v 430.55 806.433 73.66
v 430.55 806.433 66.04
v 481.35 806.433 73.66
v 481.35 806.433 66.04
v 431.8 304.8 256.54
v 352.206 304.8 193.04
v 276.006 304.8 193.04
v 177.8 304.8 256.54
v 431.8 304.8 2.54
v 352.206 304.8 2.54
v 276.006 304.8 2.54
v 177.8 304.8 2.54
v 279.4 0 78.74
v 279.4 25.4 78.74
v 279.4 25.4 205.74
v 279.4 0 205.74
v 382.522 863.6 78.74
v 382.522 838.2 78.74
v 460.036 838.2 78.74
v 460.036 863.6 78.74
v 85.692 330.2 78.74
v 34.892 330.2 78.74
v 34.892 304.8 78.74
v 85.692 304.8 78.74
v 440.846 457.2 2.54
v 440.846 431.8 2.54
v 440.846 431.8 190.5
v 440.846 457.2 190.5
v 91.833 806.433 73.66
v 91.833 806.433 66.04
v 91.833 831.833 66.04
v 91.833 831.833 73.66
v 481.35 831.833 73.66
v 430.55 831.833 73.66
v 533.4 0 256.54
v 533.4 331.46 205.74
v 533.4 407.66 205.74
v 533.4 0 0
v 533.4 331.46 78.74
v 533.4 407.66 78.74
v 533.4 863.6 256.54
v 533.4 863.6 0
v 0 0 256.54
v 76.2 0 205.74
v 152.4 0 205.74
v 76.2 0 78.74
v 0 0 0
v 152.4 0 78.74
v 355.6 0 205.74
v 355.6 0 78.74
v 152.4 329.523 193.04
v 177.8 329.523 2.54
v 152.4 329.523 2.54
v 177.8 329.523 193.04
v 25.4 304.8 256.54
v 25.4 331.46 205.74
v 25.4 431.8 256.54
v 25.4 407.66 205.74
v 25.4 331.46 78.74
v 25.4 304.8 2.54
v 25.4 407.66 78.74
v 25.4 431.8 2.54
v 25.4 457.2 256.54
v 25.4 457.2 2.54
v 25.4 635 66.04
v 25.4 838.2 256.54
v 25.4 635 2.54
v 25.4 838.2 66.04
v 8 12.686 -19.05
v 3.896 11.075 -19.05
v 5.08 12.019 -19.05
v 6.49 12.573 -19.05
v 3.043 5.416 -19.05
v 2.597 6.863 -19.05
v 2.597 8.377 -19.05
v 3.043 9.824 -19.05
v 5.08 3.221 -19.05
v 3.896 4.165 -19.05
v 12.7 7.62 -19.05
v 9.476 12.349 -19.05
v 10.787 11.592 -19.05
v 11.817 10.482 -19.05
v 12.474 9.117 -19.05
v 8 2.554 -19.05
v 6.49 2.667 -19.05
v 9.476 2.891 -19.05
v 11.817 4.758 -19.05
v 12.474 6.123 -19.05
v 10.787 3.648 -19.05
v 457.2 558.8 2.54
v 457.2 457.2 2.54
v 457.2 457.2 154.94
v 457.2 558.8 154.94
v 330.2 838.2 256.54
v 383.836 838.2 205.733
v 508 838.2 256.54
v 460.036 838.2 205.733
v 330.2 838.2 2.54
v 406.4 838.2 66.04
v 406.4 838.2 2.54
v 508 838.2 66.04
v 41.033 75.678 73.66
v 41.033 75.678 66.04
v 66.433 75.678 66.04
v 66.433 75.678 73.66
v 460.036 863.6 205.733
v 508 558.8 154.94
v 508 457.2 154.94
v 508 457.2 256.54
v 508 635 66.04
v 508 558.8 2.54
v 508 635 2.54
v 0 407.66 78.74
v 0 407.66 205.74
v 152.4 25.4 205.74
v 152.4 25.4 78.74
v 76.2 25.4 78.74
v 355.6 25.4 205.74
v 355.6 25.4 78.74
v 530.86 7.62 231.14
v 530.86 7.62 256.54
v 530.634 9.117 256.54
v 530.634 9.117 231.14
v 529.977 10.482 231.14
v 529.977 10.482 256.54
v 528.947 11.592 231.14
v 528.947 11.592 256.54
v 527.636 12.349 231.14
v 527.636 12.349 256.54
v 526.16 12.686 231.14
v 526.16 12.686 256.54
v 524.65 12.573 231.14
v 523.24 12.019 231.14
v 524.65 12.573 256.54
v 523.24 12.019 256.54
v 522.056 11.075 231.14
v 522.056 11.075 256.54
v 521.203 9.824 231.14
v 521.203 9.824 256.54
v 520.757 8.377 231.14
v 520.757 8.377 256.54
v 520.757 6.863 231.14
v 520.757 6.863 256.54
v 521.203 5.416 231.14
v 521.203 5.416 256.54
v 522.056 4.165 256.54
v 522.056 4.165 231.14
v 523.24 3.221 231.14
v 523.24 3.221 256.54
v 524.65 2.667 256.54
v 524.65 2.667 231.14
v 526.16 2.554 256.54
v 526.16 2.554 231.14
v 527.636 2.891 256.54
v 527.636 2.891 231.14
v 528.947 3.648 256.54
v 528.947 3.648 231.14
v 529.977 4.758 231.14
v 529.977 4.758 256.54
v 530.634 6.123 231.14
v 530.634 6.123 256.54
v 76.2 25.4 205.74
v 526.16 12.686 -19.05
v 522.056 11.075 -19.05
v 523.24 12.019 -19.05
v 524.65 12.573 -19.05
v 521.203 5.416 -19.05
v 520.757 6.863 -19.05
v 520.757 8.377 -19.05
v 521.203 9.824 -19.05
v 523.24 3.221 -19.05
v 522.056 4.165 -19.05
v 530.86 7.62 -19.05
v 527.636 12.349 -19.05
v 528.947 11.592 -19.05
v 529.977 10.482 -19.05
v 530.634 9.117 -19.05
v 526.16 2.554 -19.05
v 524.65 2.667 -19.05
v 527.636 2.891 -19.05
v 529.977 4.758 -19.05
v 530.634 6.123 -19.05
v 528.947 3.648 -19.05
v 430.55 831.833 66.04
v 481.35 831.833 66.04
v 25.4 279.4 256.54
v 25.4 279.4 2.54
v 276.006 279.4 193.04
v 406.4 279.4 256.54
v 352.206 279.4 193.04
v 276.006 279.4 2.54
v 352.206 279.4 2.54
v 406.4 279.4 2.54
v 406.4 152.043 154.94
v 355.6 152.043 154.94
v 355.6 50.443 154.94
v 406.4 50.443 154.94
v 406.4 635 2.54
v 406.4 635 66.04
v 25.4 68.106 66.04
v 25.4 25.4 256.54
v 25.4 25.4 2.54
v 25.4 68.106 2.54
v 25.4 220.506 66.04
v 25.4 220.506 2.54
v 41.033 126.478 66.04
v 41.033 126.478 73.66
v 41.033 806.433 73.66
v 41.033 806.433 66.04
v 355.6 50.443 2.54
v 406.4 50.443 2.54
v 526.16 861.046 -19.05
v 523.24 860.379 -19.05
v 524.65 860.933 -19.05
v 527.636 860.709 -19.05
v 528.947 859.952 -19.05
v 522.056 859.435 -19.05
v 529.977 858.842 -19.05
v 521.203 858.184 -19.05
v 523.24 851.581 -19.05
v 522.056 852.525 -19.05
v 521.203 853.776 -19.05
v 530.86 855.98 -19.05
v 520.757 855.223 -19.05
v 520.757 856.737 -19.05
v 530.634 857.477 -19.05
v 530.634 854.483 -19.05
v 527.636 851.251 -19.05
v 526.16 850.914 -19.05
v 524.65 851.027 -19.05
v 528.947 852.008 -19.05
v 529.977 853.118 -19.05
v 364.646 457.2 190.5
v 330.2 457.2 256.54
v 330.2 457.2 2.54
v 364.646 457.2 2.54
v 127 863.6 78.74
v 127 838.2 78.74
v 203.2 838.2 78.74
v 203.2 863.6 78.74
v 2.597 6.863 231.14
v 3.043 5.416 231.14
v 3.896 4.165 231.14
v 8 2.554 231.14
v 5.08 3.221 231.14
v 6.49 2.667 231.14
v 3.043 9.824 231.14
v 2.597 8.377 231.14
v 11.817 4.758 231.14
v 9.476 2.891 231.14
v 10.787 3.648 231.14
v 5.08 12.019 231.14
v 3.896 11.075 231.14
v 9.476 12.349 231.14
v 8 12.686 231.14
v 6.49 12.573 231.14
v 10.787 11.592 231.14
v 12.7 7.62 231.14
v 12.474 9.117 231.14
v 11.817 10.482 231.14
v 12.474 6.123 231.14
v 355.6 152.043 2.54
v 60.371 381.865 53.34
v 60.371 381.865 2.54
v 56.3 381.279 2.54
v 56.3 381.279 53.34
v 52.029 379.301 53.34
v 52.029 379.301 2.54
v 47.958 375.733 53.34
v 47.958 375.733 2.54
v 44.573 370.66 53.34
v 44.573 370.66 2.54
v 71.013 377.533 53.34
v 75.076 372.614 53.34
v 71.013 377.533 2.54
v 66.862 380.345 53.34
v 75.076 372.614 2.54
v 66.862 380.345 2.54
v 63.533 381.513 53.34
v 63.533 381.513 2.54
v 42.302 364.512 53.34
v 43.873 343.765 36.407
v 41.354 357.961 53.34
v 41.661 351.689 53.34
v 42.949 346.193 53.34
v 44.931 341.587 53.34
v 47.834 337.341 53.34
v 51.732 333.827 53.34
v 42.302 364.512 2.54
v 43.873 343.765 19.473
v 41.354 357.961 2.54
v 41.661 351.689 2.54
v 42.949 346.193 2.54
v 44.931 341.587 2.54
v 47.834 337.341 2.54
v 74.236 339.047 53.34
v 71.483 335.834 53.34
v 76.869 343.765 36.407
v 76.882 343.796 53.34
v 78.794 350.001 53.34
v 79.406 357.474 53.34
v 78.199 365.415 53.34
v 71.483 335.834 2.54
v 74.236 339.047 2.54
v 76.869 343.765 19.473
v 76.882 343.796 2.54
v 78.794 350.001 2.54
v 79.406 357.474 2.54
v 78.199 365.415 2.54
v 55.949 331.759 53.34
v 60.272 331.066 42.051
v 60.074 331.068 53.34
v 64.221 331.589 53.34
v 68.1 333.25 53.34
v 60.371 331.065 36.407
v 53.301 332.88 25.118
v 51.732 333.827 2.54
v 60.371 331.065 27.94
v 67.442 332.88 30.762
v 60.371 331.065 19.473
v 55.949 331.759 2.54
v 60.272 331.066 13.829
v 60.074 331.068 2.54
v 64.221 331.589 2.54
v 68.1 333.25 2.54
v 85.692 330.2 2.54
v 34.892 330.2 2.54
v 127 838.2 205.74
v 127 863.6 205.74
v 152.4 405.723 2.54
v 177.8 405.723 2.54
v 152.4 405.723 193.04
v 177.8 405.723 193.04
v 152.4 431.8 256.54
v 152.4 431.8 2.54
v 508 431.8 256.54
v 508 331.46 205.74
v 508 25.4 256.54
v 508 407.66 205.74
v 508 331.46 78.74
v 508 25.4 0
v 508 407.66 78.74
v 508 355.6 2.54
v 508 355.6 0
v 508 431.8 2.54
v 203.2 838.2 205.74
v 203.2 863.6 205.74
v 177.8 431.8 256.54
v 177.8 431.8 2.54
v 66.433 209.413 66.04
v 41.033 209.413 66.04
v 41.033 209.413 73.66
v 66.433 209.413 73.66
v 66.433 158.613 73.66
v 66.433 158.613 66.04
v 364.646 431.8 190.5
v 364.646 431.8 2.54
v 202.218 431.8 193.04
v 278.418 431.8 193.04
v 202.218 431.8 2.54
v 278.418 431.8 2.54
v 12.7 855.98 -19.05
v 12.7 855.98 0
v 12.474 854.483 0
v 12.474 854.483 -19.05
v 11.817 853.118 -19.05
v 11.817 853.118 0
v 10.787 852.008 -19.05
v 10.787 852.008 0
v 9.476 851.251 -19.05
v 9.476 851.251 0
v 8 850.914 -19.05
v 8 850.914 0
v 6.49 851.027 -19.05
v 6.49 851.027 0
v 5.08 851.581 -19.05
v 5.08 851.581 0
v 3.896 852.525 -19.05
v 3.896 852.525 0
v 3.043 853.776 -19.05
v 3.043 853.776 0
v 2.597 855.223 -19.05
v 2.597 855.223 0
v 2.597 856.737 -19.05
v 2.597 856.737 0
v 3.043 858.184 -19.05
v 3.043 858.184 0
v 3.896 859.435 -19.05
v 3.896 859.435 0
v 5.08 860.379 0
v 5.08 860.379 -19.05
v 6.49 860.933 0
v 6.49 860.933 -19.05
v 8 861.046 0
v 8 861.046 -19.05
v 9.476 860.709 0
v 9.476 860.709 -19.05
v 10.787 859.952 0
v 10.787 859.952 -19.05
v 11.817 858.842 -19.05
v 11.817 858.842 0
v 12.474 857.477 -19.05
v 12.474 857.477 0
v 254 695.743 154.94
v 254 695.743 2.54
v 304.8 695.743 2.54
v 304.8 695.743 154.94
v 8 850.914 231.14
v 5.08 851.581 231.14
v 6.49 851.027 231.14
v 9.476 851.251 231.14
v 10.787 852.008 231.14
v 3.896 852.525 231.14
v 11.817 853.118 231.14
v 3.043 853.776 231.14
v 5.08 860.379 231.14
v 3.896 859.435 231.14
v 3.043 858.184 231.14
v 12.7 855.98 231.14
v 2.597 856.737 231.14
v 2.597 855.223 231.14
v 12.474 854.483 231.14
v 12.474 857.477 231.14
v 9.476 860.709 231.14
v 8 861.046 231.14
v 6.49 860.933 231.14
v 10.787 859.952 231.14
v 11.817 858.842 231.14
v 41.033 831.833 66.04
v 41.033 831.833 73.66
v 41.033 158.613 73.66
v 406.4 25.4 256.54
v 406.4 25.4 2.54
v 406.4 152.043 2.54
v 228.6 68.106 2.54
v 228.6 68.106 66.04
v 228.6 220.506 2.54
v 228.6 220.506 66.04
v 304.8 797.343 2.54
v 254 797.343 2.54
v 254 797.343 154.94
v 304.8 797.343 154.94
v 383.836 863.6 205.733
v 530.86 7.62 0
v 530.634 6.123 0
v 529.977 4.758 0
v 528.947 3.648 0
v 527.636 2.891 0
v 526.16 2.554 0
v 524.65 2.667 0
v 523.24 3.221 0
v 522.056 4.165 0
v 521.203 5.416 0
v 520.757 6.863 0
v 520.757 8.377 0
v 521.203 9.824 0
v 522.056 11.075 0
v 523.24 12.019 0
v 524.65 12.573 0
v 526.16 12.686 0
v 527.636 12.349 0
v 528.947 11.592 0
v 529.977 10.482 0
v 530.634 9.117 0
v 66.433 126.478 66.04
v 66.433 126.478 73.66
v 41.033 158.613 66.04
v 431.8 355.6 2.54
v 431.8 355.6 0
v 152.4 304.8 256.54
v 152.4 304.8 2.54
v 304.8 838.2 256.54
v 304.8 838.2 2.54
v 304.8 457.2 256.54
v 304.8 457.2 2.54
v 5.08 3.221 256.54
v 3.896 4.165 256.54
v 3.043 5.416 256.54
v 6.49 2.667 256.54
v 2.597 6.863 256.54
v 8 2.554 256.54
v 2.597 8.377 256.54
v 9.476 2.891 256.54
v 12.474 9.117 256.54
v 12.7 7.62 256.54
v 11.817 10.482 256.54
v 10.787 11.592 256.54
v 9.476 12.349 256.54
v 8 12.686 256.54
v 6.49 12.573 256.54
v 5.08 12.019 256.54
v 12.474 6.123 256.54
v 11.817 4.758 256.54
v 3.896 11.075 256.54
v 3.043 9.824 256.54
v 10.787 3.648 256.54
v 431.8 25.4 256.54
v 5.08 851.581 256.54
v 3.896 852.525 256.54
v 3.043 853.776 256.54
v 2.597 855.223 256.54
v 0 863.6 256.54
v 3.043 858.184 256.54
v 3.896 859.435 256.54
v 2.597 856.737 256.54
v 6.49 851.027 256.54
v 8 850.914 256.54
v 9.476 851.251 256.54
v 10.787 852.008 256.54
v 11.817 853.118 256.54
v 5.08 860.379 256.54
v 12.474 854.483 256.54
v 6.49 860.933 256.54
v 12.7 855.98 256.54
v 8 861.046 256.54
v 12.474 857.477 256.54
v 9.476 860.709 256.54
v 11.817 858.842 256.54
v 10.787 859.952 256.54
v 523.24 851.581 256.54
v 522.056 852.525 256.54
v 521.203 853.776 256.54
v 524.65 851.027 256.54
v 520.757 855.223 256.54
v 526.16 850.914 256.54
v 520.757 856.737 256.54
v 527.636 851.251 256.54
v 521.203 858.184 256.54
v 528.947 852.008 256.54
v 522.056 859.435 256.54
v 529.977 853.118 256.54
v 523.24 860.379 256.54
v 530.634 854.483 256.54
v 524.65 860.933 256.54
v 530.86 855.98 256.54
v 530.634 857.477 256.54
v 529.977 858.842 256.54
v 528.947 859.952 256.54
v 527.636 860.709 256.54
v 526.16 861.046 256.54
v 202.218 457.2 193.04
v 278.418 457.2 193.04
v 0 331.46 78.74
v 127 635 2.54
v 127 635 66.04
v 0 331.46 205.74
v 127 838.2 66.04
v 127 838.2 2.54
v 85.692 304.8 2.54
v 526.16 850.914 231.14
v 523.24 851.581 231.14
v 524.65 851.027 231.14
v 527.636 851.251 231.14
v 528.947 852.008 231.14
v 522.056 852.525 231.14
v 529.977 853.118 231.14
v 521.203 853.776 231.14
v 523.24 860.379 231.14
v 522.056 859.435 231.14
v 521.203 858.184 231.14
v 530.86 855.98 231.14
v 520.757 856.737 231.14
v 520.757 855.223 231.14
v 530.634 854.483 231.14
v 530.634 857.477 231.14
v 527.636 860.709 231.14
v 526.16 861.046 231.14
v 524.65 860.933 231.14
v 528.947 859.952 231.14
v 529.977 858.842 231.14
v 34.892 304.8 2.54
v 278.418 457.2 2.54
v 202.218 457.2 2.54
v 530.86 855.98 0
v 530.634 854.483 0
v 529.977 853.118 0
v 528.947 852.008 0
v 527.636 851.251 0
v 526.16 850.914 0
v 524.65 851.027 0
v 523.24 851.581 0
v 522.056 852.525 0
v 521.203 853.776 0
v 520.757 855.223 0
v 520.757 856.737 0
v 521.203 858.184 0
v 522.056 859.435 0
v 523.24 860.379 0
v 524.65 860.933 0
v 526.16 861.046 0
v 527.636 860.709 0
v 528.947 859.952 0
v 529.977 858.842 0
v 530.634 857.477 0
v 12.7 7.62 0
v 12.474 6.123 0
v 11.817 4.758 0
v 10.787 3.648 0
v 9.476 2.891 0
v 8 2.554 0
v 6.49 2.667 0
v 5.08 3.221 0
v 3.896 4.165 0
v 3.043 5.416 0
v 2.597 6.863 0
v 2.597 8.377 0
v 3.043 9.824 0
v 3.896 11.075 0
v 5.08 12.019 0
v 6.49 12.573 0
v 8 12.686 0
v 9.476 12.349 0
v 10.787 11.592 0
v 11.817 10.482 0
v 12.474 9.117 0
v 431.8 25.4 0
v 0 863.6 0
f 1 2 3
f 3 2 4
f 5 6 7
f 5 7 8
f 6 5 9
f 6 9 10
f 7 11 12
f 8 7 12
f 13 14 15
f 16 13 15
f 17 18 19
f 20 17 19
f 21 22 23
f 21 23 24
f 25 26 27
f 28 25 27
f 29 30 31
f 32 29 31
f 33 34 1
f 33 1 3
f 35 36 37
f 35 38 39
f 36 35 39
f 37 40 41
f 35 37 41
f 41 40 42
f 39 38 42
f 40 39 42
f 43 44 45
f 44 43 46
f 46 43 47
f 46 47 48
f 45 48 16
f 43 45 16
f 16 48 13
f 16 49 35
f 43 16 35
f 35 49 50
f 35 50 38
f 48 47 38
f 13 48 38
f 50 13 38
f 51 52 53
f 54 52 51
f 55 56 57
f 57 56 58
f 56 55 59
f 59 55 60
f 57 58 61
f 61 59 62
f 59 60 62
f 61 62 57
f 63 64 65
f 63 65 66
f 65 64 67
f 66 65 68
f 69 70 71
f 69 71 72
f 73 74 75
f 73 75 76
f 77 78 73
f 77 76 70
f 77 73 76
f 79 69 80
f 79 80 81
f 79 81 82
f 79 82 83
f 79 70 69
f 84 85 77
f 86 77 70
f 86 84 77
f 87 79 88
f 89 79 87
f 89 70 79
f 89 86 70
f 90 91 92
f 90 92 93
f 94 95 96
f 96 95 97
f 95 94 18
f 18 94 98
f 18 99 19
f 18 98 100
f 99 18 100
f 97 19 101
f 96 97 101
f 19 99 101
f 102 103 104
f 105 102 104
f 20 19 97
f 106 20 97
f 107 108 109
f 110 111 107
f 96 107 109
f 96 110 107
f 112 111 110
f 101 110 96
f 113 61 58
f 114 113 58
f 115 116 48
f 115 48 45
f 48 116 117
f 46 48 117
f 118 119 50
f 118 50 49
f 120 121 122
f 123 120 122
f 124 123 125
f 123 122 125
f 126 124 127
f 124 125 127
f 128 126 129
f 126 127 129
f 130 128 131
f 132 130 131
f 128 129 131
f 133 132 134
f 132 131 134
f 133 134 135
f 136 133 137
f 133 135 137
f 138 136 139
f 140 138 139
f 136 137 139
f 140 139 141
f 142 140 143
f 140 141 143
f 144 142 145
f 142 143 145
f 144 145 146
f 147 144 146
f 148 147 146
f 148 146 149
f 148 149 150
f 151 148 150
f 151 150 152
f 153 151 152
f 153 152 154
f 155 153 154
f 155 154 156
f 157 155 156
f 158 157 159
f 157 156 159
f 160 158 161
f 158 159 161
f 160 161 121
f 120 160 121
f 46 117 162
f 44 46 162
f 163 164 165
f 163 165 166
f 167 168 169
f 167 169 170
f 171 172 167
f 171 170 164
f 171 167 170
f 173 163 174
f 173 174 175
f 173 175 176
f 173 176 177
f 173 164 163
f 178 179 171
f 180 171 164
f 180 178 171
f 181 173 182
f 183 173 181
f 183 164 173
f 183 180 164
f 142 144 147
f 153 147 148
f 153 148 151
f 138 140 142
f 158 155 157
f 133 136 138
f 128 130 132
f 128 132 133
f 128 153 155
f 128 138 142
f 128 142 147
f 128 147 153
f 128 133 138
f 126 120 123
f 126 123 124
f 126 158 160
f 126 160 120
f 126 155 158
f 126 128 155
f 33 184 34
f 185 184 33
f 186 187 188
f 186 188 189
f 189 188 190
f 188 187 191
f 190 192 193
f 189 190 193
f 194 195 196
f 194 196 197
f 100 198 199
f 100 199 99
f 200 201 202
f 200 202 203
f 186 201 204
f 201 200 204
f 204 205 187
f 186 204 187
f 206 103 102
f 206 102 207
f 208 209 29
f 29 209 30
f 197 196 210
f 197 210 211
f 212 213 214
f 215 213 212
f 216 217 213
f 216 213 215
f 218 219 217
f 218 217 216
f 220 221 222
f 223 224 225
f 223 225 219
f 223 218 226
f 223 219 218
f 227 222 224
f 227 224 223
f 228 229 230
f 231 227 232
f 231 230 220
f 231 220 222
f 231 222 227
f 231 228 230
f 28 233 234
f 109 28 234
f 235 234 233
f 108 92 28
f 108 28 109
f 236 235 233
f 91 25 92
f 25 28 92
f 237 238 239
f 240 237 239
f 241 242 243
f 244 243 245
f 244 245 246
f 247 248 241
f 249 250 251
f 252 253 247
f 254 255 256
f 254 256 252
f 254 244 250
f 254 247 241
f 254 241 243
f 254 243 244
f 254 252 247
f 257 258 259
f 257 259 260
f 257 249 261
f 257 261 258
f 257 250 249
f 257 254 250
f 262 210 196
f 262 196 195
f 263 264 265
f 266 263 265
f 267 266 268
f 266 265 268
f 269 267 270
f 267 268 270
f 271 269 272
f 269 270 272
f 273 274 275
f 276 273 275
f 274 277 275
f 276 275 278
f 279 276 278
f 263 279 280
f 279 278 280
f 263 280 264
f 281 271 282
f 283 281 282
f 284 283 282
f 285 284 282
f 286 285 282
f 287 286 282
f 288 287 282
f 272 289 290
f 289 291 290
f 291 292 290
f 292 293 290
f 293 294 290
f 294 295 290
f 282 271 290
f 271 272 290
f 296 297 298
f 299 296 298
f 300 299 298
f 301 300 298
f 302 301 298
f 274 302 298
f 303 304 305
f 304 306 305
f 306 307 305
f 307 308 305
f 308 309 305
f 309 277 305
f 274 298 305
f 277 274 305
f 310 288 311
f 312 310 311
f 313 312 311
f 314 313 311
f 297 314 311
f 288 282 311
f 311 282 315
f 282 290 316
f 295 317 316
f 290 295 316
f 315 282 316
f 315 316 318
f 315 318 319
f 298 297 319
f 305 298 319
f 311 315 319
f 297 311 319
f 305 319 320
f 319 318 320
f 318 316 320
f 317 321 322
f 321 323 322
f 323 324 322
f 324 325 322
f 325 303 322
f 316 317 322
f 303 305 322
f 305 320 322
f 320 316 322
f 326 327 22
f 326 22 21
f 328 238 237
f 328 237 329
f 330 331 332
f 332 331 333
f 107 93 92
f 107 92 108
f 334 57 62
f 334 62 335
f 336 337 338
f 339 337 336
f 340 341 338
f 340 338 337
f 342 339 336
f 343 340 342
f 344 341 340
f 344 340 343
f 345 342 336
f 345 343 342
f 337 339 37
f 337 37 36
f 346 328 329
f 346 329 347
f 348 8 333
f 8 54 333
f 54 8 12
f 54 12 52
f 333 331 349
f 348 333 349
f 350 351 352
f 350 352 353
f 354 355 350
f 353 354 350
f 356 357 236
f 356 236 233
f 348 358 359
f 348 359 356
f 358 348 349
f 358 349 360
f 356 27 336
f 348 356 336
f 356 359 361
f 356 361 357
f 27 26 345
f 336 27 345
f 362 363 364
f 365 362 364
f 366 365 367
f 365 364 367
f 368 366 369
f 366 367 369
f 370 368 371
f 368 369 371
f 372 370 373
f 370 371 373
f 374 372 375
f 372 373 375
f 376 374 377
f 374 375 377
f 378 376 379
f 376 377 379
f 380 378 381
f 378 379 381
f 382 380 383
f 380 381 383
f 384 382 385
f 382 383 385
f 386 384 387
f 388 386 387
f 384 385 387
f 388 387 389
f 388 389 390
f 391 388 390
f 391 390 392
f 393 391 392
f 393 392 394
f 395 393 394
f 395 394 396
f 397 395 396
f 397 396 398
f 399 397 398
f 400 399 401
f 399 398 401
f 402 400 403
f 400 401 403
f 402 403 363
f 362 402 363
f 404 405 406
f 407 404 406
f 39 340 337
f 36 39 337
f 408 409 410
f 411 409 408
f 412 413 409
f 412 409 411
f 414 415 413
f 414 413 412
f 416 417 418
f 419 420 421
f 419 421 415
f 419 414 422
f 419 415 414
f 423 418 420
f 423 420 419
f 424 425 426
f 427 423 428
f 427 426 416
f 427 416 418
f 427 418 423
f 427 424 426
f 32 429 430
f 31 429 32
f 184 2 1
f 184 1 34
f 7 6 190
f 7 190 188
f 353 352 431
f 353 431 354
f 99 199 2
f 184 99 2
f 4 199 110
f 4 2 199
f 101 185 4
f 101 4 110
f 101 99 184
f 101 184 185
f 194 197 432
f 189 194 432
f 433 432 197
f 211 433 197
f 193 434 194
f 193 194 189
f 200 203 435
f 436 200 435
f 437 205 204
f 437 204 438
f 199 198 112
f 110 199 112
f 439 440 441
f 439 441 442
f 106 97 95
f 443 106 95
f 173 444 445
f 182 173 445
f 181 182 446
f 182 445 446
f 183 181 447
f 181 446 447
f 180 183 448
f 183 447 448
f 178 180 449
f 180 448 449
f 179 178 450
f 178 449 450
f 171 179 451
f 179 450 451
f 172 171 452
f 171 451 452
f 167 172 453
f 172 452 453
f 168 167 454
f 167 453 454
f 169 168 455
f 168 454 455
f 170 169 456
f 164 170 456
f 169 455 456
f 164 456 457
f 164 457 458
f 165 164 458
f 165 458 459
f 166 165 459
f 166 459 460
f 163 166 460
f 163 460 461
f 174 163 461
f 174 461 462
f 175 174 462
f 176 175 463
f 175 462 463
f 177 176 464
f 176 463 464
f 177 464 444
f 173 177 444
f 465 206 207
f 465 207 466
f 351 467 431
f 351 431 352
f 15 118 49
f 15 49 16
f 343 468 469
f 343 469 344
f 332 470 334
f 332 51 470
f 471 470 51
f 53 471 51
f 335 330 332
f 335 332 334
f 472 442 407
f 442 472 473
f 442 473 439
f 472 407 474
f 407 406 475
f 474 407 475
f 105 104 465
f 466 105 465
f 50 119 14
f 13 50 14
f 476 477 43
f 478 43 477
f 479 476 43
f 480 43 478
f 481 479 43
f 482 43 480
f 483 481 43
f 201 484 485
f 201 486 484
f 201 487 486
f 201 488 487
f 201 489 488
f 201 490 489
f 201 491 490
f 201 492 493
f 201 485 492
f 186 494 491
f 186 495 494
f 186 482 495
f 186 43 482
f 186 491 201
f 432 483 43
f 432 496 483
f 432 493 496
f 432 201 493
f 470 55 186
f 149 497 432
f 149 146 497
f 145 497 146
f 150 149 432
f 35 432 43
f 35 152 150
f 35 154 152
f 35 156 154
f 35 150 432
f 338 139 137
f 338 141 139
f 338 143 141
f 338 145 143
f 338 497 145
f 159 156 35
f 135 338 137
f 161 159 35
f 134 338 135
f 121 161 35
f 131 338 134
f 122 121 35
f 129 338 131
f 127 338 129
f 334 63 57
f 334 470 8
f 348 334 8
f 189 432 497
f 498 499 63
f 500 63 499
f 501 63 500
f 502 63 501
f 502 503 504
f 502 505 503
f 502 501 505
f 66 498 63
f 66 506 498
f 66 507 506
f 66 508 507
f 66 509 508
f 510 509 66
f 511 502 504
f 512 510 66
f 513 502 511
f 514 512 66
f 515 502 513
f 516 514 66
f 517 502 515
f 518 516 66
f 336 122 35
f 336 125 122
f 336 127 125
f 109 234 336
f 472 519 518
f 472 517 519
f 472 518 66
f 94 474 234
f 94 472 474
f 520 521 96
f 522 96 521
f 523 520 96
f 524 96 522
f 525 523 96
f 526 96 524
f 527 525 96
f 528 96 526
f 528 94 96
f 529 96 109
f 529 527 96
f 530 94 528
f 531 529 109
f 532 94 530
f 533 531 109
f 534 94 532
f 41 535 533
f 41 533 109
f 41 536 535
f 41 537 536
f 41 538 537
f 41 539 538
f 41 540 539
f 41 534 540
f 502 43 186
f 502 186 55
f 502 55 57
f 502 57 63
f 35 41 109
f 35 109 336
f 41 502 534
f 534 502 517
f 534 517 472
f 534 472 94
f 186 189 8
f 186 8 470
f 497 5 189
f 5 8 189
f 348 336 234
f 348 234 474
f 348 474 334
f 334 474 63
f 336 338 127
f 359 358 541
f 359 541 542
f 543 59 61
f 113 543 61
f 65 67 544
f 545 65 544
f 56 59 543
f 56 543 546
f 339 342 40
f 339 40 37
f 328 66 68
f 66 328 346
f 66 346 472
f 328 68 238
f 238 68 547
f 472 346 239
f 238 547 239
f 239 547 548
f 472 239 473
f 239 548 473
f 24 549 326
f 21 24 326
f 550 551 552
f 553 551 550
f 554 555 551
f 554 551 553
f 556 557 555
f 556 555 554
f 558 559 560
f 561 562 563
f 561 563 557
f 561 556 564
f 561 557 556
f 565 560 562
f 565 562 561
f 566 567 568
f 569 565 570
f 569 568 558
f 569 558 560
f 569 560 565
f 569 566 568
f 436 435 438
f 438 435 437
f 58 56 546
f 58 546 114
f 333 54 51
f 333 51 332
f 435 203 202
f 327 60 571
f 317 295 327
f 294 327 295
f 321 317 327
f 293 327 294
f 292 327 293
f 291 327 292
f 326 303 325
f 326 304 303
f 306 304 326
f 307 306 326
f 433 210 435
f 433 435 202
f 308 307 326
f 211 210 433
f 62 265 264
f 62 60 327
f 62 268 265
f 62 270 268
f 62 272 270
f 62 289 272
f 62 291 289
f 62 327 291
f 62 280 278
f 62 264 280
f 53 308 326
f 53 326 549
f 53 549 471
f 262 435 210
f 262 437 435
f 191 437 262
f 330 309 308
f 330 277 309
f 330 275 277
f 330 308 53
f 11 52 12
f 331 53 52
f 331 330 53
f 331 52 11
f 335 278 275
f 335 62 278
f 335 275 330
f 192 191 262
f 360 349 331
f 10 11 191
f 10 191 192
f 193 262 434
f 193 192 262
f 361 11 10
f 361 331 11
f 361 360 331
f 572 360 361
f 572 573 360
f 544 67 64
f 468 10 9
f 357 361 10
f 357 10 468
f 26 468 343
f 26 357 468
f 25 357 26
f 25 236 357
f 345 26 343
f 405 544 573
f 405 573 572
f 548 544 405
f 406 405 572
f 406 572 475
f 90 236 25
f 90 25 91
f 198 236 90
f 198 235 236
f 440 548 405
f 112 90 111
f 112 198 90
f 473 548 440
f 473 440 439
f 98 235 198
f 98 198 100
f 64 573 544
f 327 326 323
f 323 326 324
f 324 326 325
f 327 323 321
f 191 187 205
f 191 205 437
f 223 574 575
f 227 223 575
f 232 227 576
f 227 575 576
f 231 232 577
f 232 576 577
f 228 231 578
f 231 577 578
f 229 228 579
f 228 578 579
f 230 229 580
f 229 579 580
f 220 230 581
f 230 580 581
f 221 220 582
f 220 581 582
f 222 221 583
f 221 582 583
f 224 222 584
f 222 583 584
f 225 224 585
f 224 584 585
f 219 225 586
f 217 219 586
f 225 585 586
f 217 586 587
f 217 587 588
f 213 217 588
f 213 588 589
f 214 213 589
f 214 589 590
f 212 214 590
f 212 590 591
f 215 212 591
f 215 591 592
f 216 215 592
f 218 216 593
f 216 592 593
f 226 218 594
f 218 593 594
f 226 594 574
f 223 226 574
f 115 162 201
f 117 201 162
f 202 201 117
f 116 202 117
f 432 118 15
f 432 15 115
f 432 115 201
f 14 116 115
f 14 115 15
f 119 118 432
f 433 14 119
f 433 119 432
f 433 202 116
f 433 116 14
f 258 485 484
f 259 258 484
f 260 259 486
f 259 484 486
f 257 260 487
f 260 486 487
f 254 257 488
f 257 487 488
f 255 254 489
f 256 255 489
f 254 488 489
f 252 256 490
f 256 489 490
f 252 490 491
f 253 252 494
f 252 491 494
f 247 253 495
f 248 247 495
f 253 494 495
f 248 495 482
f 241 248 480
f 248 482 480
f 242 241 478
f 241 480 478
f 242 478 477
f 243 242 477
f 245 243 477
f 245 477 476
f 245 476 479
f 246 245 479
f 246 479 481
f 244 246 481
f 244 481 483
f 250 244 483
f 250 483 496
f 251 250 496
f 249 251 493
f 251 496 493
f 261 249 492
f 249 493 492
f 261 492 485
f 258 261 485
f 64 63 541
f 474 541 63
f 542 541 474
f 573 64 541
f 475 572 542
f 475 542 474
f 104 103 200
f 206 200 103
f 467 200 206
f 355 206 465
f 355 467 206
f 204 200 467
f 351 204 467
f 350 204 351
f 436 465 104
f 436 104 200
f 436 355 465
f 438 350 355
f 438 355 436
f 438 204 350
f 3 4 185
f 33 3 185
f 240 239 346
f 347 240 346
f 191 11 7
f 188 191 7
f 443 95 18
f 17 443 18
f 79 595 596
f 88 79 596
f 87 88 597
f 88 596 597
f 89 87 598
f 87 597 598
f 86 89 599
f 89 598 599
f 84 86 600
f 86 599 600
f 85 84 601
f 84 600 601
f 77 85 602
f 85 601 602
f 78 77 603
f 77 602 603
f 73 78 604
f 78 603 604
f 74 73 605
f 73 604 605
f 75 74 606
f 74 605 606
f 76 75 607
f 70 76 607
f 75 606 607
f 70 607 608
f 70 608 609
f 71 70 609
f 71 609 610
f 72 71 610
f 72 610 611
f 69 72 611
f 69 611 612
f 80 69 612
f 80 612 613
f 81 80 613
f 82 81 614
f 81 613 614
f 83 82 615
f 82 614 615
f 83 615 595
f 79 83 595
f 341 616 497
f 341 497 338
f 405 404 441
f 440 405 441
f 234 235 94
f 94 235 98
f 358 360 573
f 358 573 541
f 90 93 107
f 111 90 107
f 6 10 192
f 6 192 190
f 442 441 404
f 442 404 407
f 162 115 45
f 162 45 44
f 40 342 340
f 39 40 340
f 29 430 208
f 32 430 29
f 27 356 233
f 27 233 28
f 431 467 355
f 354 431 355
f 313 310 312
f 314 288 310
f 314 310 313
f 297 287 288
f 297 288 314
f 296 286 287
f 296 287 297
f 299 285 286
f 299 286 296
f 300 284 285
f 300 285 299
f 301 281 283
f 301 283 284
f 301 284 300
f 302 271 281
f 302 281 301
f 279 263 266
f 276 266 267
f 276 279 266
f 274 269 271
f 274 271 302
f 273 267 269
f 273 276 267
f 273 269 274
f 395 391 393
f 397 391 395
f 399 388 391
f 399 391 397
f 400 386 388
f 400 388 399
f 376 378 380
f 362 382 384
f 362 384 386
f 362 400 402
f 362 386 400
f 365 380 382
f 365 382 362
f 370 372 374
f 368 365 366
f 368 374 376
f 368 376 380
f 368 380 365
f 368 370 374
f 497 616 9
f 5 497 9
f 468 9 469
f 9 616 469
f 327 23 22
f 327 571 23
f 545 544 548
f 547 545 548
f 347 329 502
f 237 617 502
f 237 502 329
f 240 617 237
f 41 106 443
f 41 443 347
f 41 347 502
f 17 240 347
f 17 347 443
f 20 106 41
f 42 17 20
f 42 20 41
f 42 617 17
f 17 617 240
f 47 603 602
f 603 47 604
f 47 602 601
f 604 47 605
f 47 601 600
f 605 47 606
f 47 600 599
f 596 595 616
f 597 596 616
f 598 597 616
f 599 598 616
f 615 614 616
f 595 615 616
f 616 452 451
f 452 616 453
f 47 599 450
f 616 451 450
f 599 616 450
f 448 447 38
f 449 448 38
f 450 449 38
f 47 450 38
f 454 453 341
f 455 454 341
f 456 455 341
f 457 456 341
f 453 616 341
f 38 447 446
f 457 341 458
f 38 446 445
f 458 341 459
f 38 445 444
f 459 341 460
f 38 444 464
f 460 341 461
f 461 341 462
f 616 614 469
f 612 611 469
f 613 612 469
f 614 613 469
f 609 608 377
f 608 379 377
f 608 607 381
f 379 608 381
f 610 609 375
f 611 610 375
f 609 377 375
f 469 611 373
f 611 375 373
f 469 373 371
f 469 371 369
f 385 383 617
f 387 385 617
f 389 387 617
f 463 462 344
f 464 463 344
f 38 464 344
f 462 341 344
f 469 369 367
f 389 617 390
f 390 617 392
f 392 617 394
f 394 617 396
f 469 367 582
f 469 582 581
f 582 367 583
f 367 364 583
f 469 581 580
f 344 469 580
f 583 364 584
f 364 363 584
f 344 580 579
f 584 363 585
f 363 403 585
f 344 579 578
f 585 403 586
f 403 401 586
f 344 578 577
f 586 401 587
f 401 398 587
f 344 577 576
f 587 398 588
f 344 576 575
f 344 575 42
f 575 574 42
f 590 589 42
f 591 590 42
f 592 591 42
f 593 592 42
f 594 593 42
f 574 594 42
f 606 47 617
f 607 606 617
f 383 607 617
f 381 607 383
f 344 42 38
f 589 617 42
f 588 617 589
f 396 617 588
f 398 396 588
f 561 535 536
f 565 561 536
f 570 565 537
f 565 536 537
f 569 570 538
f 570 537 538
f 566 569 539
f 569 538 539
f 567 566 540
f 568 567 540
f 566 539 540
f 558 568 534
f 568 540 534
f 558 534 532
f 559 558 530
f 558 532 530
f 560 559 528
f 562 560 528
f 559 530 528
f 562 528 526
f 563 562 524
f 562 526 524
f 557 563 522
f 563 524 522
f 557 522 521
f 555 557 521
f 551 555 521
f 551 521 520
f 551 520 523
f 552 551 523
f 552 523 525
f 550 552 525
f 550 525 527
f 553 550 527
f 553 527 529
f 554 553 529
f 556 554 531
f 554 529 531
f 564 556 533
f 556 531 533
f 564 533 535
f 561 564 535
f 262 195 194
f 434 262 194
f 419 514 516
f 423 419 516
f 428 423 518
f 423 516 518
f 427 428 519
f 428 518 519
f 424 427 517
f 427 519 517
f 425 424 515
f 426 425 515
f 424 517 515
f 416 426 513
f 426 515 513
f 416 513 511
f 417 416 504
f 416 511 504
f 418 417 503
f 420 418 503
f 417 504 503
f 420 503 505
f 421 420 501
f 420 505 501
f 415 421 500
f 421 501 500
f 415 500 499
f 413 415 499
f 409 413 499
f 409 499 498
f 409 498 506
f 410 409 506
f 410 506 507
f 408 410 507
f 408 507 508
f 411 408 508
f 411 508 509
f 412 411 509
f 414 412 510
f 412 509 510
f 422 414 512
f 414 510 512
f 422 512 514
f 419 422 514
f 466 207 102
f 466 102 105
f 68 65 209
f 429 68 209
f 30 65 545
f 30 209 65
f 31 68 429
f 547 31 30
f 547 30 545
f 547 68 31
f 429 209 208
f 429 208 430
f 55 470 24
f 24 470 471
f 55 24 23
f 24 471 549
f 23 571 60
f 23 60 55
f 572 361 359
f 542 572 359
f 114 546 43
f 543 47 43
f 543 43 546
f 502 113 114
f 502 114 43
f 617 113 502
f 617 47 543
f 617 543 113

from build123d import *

# Parameters (mm, degrees)
F0_W      = 533.4
F0_H      = 863.6
F1_DEPTH  = 2.54
F2_W      = 533.4
F2_H      = 863.6
F2_W_2    = 482.6
F2_H_2    = 812.8
F3_DEPTH  = 254
F4_W      = 76.2
F4_H      = 330.2
F5_DEPTH  = 25.4
F6_W      = 177.8
F6_H      = 25.4
F6_W_2    = 279.4
F7_DEPTH  = 254
F8_W      = 25.4
F8_H      = 254
F8_H_2    = 127
F9_DEPTH  = 254
F10_W     = 76.2
F10_H     = 190.5
F10_H_2   = 187.96
F11_DEPTH = 25.4
F12_W     = 76.2
F12_H     = 190.5
F13_DEPTH = 25.4
F14_W     = 76.2
F14_H     = 190.5
F15_DEPTH = 25.4
F17_DEPTH = 25.4
F18_W     = 76.2
F18_H     = 127
F19_DEPTH = 25.4
F20_W     = 76.2
F20_H     = 127
F21_DEPTH = 25.4
F22_W     = 76.2
F22_H     = 127
F23_DEPTH = 25.4
F24_W     = 76.2
F24_H     = 127
F25_DEPTH = 25.4
F26_R     = 5.08
F27_DEPTH = 19.05
F28_R     = 5.08
F29_DEPTH = 25.4
F30_W     = 101.6
F30_H     = 203.2
F30_W_2   = 203.2
F30_H_2   = 152.4
F31_DEPTH = 63.5
F32_W     = 50.8
F32_H     = 25.4
F32_W_2   = 25.4
F32_H_2   = 50.8
F33_DEPTH = 7.62
F34_W     = 50.8
F34_H     = 101.6
F35_DEPTH = 152.4
F36_W     = 50.8
F36_H     = 25.4
F37_DEPTH = 50.8
F38_W     = 50.8
F38_H     = 25.4
F39_DEPTH = 25.4


with BuildPart() as f1:
    # F0 (on Top) → F1 (new body)
    with BuildSketch(Plane.XY):
        with Locations((266.7, 431.8)):
            Rectangle(F0_W, F0_H)
    extrude(amount=F1_DEPTH)

    # F2 (on face) → F3 (join)
    with BuildSketch(Plane.XY.offset(2.54)):
        with Locations((266.7, 431.8)):
            Rectangle(F2_W, F2_H)
        with Locations((266.7, 431.8)):
            Rectangle(F2_W_2, F2_H_2, mode=Mode.SUBTRACT)
    extrude(amount=F3_DEPTH)

    # F4 (on face) → F5 (cut)
    with BuildSketch(Plane.XY.offset(2.54)):
        with Locations((469.9, 190.5)):
            Rectangle(F4_W, F4_H)
    extrude(amount=-F5_DEPTH, mode=Mode.SUBTRACT)

    # F6 (on face) → F7 (join)
    with BuildSketch(Plane.XY.offset(2.54)):
        with Locations((419.1, 444.5)):
            Rectangle(F6_W, F6_H)
        Polygon((304.8, 431.8), (330.2, 431.8), (330.2, 457.2), (330.2, 838.2), (304.8, 838.2), (304.8, 457.2), align=None)
        with Locations((165.1, 444.5)):
            Rectangle(F6_W_2, F6_H)
    extrude(amount=F7_DEPTH)

    # F8 (on face) → F9 (join)
    with BuildSketch(Plane.XY.offset(2.54)):
        Polygon((152.4, 304.8), (25.4, 304.8), (25.4, 279.4), (406.4, 279.4), (431.8, 279.4), (431.8, 304.8), (177.8, 304.8), align=None)
        with Locations((419.1, 152.4)):
            Rectangle(F8_W, F8_H)
        with Locations((165.1, 368.3)):
            Rectangle(F8_W, F8_H_2)
    extrude(amount=F9_DEPTH)

    # F10 (on face) → F11 (cut)
    with BuildSketch(Plane.XZ.offset(-431.8)):
        with Locations((240.317534, 97.79)):
            Rectangle(F10_W, F10_H)
        with Locations((402.745839, 96.52)):
            Rectangle(F10_W, F10_H_2)
    extrude(amount=-F11_DEPTH, mode=Mode.SUBTRACT)

    # F12 (on face) → F13 (cut)
    with BuildSketch(Plane.YZ.offset(177.8)):
        with Locations((367.623325, 97.79)):
            Rectangle(F12_W, F12_H)
    extrude(amount=-F13_DEPTH, mode=Mode.SUBTRACT)

    # F14 (on face) → F15 (cut)
    with BuildSketch(Plane(origin=(0, 304.8, 0), x_dir=(-1, 0, 0), z_dir=(0, 1, 0))):
        with Locations((-314.105634, 97.79)):
            Rectangle(F14_W, F14_H)
    extrude(amount=-F15_DEPTH, mode=Mode.SUBTRACT)

    # F16 (on face) → F17 (cut)
    with BuildSketch(Plane.XZ.offset(-838.2)):
        Polygon((383.836448, 205.733197), (382.521942, 78.74), (460.036448, 78.74), (460.036448, 205.733197), align=None)
    extrude(amount=-F17_DEPTH, mode=Mode.SUBTRACT)

    # F18 (on face) → F19 (cut)
    with BuildSketch(Plane.XZ.offset(-838.2)):
        with Locations((165.1, 142.24)):
            Rectangle(F18_W, F18_H)
    extrude(amount=-F19_DEPTH, mode=Mode.SUBTRACT)

    # F20 (on face) → F21 (cut)
    with BuildSketch(Plane.YZ.offset(25.4)):
        with Locations((369.560152, 142.24)):
            Rectangle(F20_W, F20_H)
    extrude(amount=-F21_DEPTH, mode=Mode.SUBTRACT)

    # F22 (on face) → F23 (cut)
    with BuildSketch(Plane(origin=(0, 25.4, 0), x_dir=(-1, 0, 0), z_dir=(0, 1, 0))):
        with Locations((-317.5, 142.24)):
            Rectangle(F22_W, F22_H)
        with Locations((-114.3, 142.24)):
            Rectangle(F22_W, F22_H)
    extrude(amount=-F23_DEPTH, mode=Mode.SUBTRACT)

    # F24 (on face) → F25 (cut)
    with BuildSketch(Plane(origin=(508, 0, 0), x_dir=(0, -1, 0), z_dir=(-1, 0, 0))):
        with Locations((-369.560152, 142.24)):
            Rectangle(F24_W, F24_H)
    extrude(amount=-F25_DEPTH, mode=Mode.SUBTRACT)

    # F26 (on face) → F27 (join)
    with BuildSketch(Plane(origin=(0, 0, 0), x_dir=(1, 0, 0), z_dir=(0, 0, -1))):
        with Locations((7.62, -7.62)):
            Circle(F26_R)
        with Locations((525.78, -7.62)):
            Circle(F26_R)
        with Locations((525.78, -855.98)):
            Circle(F26_R)
        with Locations((7.62, -855.98)):
            Circle(F26_R)
    extrude(amount=F27_DEPTH)

    # F28 (on face) → F29 (cut)
    with BuildSketch(Plane.XY.offset(256.54)):
        with Locations((7.62, 7.62)):
            Circle(F28_R)
        with Locations((525.78, 7.62)):
            Circle(F28_R)
        with Locations((525.78, 855.98)):
            Circle(F28_R)
        with Locations((7.62, 855.98)):
            Circle(F28_R)
    extrude(amount=-F29_DEPTH, mode=Mode.SUBTRACT)

    # F30 (on face) → F31 (join)
    with BuildSketch(Plane.XY.offset(2.54)):
        with Locations((76.2, 736.6)):
            Rectangle(F30_W, F30_H)
        with Locations((457.2, 736.6)):
            Rectangle(F30_W, F30_H)
        with Locations((127, 144.306398)):
            Rectangle(F30_W_2, F30_H_2)
    extrude(amount=F31_DEPTH)

    # F32 (on face) → F33 (join)
    with BuildSketch(Plane.XY.offset(66.04)):
        with Locations((66.433271, 819.132545)):
            Rectangle(F32_W, F32_H)
        with Locations((455.950456, 819.132545)):
            Rectangle(F32_W, F32_H)
        with Locations((53.733271, 101.077922)):
            Rectangle(F32_W_2, F32_H_2)
        with Locations((53.733271, 184.012836)):
            Rectangle(F32_W_2, F32_H_2)
    extrude(amount=F33_DEPTH)

    # F34 (on face) → F35 (join)
    with BuildSketch(Plane.XY.offset(2.54)):
        with Locations((279.4, 746.542548)):
            Rectangle(F34_W, F34_H)
        with Locations((482.6, 508)):
            Rectangle(F34_W, F34_H)
        with Locations((381, 101.243105)):
            Rectangle(F34_W, F34_H)
    extrude(amount=F35_DEPTH)

    # F36 (on face) → F37 (join)
    with BuildSketch(Plane.XY.offset(2.54)):
        with Locations((60.292414, 317.5)):
            Rectangle(F36_W, F36_H)
        with BuildLine():
            add(Edge.make_bspline(
                [(60.37103, 381.865399), (27.375462, 381.865399), (43.873246, 343.765399), (60.37103, 305.665399), (76.868814, 343.765399), (93.366598, 381.865399), (60.37103, 381.865399)],
                knots=[0, 0, 0, 2.094395, 2.094395, 4.18879, 4.18879, 6.283185, 6.283185, 6.283185], degree=2, weights=[1, 0.5, 1, 0.5, 1, 0.5, 1]))
        make_face()
    extrude(amount=F37_DEPTH)

    # F38 (on face) → F39 (join)
    with BuildSketch(Plane.XY.offset(53.34)):
        with Locations((60.292414, 317.5)):
            Rectangle(F38_W, F38_H)
    extrude(amount=F39_DEPTH)


solid = f1.part
